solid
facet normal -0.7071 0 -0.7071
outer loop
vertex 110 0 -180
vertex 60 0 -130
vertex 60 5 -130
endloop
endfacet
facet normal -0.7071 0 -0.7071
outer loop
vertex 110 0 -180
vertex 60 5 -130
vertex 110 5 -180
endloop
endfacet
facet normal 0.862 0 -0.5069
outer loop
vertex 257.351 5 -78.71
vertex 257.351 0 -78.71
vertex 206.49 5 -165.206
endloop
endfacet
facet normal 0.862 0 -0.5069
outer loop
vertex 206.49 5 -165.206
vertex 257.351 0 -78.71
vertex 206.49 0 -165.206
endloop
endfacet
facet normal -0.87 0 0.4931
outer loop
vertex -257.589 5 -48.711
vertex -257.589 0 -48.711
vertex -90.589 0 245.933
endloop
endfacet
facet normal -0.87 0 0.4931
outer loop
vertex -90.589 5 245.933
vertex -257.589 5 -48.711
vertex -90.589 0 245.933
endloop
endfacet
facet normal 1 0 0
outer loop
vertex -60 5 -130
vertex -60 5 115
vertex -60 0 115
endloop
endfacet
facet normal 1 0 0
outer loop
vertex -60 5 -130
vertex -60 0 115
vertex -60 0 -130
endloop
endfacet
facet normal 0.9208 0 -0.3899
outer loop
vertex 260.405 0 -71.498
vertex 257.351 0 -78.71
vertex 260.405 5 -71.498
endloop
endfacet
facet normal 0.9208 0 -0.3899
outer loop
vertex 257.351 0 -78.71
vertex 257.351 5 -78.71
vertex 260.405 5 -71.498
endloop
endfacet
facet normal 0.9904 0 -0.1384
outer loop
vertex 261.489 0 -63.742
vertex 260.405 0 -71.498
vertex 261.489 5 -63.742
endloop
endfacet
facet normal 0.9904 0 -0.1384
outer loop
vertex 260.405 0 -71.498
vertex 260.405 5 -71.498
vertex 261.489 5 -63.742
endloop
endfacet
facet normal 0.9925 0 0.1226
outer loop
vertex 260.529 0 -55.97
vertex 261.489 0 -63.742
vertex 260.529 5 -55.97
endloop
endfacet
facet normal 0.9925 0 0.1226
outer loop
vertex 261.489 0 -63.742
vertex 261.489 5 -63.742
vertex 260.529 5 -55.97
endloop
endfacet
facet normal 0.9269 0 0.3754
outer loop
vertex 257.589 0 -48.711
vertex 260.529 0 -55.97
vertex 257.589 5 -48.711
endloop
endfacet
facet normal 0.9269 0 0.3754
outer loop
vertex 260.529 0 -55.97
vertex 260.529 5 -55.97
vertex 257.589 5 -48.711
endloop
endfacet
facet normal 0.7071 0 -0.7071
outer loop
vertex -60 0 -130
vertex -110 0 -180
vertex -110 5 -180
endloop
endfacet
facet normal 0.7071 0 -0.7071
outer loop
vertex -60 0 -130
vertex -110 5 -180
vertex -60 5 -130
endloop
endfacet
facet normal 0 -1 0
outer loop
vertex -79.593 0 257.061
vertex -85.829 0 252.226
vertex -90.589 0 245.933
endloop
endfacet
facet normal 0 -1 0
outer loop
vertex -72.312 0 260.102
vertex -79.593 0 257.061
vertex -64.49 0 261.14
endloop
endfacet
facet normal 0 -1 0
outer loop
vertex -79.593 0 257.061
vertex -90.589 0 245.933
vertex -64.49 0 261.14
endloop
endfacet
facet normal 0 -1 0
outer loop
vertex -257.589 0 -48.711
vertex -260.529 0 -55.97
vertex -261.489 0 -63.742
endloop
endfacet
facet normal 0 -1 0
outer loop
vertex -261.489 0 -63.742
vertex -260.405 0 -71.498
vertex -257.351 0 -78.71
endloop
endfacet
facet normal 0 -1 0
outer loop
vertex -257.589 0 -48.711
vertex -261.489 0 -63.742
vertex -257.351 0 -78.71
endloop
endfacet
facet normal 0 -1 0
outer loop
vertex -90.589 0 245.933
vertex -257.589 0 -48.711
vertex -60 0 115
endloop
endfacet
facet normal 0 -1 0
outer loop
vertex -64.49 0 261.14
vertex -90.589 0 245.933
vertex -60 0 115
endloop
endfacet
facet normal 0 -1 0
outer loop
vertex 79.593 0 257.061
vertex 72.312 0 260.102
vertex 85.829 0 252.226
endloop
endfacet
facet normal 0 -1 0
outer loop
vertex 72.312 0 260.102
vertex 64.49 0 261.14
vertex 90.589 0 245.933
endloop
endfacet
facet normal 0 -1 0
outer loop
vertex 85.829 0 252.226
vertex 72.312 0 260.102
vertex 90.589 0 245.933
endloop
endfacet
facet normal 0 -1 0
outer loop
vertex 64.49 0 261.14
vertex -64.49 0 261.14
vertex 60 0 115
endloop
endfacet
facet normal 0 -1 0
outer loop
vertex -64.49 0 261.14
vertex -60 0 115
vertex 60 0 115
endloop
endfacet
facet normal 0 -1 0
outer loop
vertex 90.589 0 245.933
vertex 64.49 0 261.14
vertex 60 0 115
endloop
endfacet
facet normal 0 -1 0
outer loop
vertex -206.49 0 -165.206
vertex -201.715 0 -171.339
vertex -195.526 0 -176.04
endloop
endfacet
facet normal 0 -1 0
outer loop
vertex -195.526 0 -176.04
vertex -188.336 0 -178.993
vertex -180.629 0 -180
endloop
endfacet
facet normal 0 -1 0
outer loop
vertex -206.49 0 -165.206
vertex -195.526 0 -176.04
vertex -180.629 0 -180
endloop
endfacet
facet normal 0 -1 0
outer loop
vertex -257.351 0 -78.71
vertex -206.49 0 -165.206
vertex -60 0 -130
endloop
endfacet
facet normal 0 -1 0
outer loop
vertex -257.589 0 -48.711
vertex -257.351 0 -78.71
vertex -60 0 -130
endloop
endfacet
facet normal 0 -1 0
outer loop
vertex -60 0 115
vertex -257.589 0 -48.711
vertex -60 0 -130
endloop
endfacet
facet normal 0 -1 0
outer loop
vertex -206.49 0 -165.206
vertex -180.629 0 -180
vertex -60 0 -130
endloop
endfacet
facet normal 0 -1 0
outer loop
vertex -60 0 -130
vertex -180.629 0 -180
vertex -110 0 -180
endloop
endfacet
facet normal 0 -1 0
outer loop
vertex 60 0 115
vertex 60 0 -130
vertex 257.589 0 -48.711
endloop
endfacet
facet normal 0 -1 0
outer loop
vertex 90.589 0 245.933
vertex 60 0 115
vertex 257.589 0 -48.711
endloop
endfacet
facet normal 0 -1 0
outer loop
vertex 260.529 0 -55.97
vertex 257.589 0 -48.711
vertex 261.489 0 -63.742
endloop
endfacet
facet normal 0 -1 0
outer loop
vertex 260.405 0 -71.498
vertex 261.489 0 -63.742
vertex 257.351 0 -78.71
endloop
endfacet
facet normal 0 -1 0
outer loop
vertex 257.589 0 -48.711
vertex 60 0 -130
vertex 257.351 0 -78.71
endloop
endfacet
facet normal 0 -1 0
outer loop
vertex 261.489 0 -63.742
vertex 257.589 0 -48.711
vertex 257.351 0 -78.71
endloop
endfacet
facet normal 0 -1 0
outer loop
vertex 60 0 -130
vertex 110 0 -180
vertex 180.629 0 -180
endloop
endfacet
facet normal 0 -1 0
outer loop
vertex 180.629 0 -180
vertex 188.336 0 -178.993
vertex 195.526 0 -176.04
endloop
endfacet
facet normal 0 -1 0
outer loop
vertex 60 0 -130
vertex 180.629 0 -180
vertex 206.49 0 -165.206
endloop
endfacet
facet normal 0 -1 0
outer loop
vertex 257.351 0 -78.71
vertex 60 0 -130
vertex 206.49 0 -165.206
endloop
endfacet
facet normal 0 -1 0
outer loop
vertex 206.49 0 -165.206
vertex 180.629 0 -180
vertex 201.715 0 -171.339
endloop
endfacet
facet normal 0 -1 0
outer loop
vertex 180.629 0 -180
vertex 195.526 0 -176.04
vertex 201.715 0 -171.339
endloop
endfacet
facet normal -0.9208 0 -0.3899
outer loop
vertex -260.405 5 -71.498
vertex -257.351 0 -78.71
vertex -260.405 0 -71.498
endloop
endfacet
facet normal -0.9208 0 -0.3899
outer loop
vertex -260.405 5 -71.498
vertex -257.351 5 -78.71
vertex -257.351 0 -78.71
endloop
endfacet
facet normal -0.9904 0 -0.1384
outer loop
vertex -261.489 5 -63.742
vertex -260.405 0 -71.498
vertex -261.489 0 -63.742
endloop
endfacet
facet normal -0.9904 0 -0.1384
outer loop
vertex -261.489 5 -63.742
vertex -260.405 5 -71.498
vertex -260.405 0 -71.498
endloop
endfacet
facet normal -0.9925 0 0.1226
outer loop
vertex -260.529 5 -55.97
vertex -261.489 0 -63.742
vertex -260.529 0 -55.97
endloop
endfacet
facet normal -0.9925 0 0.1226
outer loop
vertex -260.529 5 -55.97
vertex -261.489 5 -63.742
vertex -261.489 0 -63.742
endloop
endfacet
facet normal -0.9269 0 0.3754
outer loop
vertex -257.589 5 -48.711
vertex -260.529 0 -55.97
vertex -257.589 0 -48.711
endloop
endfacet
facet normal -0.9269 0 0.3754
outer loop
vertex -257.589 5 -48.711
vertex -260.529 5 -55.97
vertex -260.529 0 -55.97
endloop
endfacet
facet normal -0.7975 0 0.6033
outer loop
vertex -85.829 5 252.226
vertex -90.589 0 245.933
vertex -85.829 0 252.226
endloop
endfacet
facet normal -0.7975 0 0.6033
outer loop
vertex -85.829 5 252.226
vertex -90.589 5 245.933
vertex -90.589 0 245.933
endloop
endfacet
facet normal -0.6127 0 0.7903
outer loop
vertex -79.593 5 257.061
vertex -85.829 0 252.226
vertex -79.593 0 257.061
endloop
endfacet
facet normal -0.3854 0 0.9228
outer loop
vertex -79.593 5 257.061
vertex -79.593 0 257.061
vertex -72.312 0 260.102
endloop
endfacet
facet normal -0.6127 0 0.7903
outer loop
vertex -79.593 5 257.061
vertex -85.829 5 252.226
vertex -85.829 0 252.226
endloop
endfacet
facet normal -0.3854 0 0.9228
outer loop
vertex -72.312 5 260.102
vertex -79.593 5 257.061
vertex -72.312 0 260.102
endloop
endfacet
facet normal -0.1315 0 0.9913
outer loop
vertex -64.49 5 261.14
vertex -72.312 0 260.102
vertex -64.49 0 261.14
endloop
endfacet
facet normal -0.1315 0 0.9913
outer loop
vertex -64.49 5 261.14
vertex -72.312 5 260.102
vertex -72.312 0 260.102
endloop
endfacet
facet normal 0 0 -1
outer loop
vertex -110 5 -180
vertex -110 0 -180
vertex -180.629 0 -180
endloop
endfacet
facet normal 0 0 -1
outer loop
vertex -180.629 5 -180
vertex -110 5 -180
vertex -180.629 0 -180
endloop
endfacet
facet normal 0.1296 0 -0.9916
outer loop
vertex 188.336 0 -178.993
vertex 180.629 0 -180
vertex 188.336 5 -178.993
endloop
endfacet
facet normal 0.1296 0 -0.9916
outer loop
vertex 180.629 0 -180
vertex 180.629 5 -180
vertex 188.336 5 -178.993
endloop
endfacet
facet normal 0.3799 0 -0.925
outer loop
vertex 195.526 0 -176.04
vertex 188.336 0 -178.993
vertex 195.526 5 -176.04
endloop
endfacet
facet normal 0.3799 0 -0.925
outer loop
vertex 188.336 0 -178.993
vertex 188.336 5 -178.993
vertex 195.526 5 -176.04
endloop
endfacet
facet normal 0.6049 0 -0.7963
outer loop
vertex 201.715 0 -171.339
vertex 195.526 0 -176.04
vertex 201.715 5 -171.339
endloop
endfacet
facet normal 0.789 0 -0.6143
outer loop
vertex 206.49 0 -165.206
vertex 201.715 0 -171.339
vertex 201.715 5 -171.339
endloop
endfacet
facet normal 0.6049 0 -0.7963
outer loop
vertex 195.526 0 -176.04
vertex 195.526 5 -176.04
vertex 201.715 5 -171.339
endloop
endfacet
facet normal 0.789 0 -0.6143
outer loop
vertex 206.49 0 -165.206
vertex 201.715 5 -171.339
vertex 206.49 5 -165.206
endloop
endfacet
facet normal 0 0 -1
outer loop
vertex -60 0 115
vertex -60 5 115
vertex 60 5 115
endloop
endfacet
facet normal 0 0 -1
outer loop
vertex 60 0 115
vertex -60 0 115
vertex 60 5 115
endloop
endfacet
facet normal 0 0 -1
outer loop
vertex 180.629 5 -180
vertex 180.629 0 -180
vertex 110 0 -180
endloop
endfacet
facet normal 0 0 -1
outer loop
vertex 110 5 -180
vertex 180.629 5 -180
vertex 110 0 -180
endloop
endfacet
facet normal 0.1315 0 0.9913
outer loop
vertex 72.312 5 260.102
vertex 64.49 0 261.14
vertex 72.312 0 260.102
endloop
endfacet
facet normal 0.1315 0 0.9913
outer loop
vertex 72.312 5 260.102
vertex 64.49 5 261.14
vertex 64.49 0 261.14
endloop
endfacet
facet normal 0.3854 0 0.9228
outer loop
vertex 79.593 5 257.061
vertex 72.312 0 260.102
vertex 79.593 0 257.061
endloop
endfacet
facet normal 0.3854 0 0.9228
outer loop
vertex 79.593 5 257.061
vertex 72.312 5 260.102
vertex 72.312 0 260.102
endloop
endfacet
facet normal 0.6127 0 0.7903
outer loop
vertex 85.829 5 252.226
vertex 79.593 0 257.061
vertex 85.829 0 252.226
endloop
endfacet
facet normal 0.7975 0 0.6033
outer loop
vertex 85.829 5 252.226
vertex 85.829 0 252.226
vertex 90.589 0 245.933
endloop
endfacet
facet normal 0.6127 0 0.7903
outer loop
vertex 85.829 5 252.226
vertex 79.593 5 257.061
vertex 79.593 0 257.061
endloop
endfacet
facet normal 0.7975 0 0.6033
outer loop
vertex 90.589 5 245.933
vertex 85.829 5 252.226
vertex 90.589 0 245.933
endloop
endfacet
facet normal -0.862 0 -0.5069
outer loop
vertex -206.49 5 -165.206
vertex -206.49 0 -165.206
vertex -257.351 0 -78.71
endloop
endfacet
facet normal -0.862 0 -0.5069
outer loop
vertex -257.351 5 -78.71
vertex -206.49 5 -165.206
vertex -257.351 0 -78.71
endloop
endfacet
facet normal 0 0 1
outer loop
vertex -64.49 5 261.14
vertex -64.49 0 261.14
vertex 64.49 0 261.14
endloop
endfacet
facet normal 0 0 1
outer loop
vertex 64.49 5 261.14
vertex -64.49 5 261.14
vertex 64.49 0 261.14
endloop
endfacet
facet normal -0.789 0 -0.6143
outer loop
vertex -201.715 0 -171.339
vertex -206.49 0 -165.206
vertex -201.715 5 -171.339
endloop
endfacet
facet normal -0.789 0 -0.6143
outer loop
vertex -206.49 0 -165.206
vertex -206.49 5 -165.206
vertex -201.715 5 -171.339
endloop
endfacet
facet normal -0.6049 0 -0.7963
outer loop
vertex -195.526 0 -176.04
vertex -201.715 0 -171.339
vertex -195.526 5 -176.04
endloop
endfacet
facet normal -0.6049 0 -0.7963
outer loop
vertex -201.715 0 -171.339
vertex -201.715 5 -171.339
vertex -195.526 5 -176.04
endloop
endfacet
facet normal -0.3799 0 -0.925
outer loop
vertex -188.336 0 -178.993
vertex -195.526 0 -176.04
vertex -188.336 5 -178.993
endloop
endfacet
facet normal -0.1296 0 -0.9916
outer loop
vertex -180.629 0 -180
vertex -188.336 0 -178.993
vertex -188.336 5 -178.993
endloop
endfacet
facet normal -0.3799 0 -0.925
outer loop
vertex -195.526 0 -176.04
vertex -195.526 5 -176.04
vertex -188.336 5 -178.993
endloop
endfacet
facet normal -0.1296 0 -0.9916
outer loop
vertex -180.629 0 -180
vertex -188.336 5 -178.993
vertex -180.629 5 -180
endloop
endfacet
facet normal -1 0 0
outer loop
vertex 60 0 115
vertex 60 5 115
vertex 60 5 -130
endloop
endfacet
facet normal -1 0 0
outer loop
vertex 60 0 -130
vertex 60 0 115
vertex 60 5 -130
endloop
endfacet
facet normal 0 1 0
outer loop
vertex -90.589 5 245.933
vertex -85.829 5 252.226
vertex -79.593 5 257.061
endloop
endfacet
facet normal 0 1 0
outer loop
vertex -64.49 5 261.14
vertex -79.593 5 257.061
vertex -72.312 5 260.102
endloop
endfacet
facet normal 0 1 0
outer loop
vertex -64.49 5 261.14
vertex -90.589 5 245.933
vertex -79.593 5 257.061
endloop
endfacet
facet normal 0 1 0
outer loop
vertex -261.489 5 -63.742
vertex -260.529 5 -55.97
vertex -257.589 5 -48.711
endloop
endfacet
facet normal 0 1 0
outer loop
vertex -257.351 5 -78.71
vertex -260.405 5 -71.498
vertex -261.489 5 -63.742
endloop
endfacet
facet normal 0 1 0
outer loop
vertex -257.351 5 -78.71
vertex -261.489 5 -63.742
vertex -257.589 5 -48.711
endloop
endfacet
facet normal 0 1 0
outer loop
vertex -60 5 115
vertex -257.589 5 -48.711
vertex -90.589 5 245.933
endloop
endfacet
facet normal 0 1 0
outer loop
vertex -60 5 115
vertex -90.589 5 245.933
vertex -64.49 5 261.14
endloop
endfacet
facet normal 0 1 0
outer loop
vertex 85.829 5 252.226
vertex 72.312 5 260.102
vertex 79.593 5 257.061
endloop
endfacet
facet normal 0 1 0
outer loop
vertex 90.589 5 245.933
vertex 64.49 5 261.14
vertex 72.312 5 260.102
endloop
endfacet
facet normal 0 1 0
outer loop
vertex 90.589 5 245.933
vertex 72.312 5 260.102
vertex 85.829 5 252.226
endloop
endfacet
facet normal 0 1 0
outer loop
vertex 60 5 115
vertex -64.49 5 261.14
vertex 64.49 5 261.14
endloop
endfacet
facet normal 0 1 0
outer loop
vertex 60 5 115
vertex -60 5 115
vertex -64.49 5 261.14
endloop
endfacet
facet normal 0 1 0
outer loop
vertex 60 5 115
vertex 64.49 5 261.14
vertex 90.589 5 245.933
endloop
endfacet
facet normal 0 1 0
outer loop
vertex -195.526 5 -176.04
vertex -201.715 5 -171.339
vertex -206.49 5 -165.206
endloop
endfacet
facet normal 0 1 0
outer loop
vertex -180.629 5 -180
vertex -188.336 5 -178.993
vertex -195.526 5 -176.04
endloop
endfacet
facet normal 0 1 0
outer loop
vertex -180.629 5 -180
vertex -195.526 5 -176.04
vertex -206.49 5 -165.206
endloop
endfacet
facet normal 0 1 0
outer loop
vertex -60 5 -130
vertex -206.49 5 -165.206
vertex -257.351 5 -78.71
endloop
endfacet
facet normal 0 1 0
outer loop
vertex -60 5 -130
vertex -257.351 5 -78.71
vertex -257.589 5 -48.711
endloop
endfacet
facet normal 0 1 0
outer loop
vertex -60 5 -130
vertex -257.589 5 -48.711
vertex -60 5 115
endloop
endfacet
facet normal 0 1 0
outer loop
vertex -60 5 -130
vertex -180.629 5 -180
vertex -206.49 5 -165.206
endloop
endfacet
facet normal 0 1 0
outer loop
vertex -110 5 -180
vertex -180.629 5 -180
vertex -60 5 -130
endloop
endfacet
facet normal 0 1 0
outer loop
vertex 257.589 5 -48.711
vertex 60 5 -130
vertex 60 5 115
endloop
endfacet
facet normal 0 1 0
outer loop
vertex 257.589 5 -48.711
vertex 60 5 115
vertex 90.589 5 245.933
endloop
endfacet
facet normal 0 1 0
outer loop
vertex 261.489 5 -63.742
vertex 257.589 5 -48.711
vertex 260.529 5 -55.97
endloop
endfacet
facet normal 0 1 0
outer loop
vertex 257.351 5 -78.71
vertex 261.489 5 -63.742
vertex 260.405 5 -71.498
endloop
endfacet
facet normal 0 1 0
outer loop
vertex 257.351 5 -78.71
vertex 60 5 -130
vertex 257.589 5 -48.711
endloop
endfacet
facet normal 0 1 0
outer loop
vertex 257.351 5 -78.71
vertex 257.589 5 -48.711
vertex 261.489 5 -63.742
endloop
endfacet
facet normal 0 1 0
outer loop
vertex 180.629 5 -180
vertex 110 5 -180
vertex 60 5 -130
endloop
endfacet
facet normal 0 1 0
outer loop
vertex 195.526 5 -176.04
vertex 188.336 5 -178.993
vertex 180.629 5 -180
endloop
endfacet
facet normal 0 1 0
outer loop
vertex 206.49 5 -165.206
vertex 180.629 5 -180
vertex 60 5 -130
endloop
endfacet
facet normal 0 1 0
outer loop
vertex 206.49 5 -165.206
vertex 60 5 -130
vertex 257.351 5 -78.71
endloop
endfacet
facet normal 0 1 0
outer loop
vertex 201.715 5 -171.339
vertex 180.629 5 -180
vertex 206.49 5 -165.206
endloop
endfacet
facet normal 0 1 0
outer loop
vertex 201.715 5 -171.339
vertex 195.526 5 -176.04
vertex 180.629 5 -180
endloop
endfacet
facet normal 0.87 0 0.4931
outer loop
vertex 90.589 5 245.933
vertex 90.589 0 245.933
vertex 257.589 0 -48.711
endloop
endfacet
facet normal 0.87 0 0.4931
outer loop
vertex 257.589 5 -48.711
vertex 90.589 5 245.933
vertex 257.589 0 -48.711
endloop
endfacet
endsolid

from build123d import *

# Parameters (mm, degrees)
EXTRUDE_1_DEPTH          = 5
CUT_EXTRUDE_1_DEPTH      = 373.886350983
CUT_EXTRUDE_1_DEPTH_BACK = 373.886350983
CUT_EXTRUDE_2_REACH      = 374.886
SKETCH_4_W               = 120
SKETCH_4_H               = 360
FILLET_1_R               = 30


with BuildPart() as part:
    # 草图2 → 凸台-拉伸1 (new body)
    with BuildSketch(Plane(origin=(0, 0, 0), x_dir=(1, 0, 0), z_dir=(0, 1, 0))):
        Polygon((-197.790744863, 180), (-266.129914045, 63.779122951), (-81.97, -261.14), (81.97, -261.14), (266.129914045, 63.779122951), (197.790744863, 180), align=None)
    extrude(amount=EXTRUDE_1_DEPTH)

    # 草图3 → 切除-拉伸1 (cut, two sides: drawn at the far end of the back side and taken through both)
    with BuildSketch(Plane(origin=(0, 5, 0), x_dir=(1, 0, 0), z_dir=(0, 1, 0)).offset(-CUT_EXTRUDE_1_DEPTH_BACK)):
        Polygon((25, 95), (110, 180), (-110, 180), (-25, 95), align=None)
    extrude(amount=CUT_EXTRUDE_1_DEPTH + CUT_EXTRUDE_1_DEPTH_BACK, mode=Mode.SUBTRACT)

    # 草图4 → 切除-拉伸2 (cut, up to next)
    with BuildSketch(Plane(origin=(0, 5, 0), x_dir=(1, 0, 0), z_dir=(0, 1, 0)), mode=Mode.PRIVATE) as cut_extrude_2_sk1:
        with Locations((0, 65)):
            Rectangle(SKETCH_4_W, SKETCH_4_H)
    cut_extrude_2_tool1 = extrude(cut_extrude_2_sk1.sketch, amount=-CUT_EXTRUDE_2_REACH, mode=Mode.PRIVATE) & part.part
    add(cut_extrude_2_tool1.solids().sort_by_distance((0, 5, -65))[0], mode=Mode.SUBTRACT)

    # 圆角1
    fillet_1_edges = [part.edges().sort_by_distance(p)[0] for p in [
        (197.790744863, 2.5, -180),
        (266.129914045, 2.5, -63.779122951),
        (81.97, 2.5, 261.14),
        (-81.97, 2.5, 261.14),
        (-266.129914045, 2.5, -63.779122951),
        (-197.790744863, 2.5, -180),
    ]]
    fillet(fillet_1_edges, radius=FILLET_1_R)


solid = part.part
